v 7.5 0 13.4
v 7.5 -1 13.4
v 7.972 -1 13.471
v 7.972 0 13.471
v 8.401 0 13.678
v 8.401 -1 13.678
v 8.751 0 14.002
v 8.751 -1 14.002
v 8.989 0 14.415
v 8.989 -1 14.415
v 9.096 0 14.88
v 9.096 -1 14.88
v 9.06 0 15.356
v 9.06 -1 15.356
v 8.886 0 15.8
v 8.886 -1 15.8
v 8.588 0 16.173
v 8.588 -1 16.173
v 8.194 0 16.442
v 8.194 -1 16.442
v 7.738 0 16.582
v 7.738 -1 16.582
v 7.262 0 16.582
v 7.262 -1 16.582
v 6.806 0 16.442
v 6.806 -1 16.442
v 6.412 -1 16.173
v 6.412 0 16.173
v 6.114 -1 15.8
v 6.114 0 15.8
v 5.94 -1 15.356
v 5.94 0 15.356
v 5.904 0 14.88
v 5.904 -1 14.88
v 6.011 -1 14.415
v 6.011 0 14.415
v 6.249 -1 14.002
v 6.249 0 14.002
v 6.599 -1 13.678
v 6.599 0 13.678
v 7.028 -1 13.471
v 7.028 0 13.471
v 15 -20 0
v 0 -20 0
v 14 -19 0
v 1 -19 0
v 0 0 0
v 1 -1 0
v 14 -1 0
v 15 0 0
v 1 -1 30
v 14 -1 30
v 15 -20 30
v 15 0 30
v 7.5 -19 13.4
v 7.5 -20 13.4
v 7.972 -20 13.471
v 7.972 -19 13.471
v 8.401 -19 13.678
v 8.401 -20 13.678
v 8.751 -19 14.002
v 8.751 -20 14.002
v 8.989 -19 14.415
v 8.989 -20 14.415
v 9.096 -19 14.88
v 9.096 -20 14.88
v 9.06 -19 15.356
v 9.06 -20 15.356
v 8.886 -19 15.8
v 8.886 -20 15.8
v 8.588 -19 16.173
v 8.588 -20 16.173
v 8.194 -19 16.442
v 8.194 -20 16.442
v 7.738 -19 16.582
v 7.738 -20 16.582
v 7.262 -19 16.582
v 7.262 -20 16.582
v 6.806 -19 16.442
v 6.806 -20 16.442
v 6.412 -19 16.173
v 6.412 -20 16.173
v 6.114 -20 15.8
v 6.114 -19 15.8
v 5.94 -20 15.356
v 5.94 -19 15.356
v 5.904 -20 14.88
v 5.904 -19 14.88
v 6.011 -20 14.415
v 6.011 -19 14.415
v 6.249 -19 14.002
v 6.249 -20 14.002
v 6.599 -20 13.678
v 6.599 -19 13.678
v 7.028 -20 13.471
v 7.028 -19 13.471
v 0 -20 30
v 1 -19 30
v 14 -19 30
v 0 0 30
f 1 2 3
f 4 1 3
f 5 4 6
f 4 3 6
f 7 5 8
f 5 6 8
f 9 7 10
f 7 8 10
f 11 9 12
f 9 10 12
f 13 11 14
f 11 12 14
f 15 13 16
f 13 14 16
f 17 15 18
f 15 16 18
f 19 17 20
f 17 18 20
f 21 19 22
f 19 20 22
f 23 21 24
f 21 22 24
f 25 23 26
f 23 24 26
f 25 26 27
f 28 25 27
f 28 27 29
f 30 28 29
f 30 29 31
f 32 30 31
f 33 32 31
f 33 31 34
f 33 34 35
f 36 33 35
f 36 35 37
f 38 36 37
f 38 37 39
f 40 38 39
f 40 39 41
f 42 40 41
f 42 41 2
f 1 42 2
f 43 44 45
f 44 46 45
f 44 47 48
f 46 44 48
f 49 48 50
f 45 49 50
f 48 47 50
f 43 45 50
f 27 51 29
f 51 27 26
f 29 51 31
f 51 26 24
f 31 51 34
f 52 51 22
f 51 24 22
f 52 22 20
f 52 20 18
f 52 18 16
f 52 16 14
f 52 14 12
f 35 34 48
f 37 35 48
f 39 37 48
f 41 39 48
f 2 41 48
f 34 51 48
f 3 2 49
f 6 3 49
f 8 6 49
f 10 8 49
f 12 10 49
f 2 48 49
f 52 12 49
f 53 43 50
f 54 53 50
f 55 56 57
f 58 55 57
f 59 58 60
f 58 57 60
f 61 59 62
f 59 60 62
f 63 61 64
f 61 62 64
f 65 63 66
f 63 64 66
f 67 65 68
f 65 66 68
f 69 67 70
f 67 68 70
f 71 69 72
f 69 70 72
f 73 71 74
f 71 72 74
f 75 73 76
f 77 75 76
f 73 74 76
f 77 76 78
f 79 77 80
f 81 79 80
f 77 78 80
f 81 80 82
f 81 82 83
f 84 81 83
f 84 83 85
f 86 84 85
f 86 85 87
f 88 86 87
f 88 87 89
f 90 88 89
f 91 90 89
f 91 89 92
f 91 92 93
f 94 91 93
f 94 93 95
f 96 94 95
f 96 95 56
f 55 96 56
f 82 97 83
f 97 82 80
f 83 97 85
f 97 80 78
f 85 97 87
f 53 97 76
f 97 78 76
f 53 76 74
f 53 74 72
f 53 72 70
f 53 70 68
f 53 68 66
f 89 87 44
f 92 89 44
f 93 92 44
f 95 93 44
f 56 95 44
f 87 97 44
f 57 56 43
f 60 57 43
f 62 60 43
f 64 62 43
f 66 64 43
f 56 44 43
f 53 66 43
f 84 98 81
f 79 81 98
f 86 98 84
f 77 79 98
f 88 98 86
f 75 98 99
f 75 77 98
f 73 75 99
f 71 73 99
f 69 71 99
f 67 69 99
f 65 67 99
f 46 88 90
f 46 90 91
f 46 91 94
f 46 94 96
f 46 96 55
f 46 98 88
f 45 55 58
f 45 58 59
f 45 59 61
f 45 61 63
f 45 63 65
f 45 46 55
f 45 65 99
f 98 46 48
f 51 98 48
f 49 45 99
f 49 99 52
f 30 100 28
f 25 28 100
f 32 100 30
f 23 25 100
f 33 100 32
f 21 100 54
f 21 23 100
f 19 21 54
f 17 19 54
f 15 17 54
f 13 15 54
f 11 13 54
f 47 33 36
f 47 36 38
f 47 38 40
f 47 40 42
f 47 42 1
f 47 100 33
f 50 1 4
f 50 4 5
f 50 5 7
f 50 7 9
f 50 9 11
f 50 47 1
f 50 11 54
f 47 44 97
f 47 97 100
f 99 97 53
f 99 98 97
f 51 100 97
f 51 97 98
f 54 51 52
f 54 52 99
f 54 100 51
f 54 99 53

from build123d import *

# Parameters (mm, degrees)
SKETCH_1_W          = 15
SKETCH_1_H          = 20
SKETCH_1_W_2        = 13
SKETCH_1_H_2        = 18
EXTRUDE_1_DEPTH     = 30
SKETCH_3_R          = 1.6
CUT_EXTRUDE_2_DEPTH = 40.05124838


with BuildPart() as part:
    # 草图1 → 拉伸-薄壁1 (new body)
    with BuildSketch(Plane.XY):
        with Locations((7.5, -10)):
            Rectangle(SKETCH_1_W, SKETCH_1_H)
        with Locations((7.5, -10)):
            Rectangle(SKETCH_1_W_2, SKETCH_1_H_2, mode=Mode.SUBTRACT)
    extrude(amount=EXTRUDE_1_DEPTH)

    # 草图3 → 切除-拉伸2 (cut, through all)
    with BuildSketch(Plane.XZ.offset(20)):
        with Locations(Location((7.5, 15, 0), (0, 0, 270))):
            Circle(SKETCH_3_R)
    extrude(amount=-CUT_EXTRUDE_2_DEPTH, mode=Mode.SUBTRACT)


solid = part.part
